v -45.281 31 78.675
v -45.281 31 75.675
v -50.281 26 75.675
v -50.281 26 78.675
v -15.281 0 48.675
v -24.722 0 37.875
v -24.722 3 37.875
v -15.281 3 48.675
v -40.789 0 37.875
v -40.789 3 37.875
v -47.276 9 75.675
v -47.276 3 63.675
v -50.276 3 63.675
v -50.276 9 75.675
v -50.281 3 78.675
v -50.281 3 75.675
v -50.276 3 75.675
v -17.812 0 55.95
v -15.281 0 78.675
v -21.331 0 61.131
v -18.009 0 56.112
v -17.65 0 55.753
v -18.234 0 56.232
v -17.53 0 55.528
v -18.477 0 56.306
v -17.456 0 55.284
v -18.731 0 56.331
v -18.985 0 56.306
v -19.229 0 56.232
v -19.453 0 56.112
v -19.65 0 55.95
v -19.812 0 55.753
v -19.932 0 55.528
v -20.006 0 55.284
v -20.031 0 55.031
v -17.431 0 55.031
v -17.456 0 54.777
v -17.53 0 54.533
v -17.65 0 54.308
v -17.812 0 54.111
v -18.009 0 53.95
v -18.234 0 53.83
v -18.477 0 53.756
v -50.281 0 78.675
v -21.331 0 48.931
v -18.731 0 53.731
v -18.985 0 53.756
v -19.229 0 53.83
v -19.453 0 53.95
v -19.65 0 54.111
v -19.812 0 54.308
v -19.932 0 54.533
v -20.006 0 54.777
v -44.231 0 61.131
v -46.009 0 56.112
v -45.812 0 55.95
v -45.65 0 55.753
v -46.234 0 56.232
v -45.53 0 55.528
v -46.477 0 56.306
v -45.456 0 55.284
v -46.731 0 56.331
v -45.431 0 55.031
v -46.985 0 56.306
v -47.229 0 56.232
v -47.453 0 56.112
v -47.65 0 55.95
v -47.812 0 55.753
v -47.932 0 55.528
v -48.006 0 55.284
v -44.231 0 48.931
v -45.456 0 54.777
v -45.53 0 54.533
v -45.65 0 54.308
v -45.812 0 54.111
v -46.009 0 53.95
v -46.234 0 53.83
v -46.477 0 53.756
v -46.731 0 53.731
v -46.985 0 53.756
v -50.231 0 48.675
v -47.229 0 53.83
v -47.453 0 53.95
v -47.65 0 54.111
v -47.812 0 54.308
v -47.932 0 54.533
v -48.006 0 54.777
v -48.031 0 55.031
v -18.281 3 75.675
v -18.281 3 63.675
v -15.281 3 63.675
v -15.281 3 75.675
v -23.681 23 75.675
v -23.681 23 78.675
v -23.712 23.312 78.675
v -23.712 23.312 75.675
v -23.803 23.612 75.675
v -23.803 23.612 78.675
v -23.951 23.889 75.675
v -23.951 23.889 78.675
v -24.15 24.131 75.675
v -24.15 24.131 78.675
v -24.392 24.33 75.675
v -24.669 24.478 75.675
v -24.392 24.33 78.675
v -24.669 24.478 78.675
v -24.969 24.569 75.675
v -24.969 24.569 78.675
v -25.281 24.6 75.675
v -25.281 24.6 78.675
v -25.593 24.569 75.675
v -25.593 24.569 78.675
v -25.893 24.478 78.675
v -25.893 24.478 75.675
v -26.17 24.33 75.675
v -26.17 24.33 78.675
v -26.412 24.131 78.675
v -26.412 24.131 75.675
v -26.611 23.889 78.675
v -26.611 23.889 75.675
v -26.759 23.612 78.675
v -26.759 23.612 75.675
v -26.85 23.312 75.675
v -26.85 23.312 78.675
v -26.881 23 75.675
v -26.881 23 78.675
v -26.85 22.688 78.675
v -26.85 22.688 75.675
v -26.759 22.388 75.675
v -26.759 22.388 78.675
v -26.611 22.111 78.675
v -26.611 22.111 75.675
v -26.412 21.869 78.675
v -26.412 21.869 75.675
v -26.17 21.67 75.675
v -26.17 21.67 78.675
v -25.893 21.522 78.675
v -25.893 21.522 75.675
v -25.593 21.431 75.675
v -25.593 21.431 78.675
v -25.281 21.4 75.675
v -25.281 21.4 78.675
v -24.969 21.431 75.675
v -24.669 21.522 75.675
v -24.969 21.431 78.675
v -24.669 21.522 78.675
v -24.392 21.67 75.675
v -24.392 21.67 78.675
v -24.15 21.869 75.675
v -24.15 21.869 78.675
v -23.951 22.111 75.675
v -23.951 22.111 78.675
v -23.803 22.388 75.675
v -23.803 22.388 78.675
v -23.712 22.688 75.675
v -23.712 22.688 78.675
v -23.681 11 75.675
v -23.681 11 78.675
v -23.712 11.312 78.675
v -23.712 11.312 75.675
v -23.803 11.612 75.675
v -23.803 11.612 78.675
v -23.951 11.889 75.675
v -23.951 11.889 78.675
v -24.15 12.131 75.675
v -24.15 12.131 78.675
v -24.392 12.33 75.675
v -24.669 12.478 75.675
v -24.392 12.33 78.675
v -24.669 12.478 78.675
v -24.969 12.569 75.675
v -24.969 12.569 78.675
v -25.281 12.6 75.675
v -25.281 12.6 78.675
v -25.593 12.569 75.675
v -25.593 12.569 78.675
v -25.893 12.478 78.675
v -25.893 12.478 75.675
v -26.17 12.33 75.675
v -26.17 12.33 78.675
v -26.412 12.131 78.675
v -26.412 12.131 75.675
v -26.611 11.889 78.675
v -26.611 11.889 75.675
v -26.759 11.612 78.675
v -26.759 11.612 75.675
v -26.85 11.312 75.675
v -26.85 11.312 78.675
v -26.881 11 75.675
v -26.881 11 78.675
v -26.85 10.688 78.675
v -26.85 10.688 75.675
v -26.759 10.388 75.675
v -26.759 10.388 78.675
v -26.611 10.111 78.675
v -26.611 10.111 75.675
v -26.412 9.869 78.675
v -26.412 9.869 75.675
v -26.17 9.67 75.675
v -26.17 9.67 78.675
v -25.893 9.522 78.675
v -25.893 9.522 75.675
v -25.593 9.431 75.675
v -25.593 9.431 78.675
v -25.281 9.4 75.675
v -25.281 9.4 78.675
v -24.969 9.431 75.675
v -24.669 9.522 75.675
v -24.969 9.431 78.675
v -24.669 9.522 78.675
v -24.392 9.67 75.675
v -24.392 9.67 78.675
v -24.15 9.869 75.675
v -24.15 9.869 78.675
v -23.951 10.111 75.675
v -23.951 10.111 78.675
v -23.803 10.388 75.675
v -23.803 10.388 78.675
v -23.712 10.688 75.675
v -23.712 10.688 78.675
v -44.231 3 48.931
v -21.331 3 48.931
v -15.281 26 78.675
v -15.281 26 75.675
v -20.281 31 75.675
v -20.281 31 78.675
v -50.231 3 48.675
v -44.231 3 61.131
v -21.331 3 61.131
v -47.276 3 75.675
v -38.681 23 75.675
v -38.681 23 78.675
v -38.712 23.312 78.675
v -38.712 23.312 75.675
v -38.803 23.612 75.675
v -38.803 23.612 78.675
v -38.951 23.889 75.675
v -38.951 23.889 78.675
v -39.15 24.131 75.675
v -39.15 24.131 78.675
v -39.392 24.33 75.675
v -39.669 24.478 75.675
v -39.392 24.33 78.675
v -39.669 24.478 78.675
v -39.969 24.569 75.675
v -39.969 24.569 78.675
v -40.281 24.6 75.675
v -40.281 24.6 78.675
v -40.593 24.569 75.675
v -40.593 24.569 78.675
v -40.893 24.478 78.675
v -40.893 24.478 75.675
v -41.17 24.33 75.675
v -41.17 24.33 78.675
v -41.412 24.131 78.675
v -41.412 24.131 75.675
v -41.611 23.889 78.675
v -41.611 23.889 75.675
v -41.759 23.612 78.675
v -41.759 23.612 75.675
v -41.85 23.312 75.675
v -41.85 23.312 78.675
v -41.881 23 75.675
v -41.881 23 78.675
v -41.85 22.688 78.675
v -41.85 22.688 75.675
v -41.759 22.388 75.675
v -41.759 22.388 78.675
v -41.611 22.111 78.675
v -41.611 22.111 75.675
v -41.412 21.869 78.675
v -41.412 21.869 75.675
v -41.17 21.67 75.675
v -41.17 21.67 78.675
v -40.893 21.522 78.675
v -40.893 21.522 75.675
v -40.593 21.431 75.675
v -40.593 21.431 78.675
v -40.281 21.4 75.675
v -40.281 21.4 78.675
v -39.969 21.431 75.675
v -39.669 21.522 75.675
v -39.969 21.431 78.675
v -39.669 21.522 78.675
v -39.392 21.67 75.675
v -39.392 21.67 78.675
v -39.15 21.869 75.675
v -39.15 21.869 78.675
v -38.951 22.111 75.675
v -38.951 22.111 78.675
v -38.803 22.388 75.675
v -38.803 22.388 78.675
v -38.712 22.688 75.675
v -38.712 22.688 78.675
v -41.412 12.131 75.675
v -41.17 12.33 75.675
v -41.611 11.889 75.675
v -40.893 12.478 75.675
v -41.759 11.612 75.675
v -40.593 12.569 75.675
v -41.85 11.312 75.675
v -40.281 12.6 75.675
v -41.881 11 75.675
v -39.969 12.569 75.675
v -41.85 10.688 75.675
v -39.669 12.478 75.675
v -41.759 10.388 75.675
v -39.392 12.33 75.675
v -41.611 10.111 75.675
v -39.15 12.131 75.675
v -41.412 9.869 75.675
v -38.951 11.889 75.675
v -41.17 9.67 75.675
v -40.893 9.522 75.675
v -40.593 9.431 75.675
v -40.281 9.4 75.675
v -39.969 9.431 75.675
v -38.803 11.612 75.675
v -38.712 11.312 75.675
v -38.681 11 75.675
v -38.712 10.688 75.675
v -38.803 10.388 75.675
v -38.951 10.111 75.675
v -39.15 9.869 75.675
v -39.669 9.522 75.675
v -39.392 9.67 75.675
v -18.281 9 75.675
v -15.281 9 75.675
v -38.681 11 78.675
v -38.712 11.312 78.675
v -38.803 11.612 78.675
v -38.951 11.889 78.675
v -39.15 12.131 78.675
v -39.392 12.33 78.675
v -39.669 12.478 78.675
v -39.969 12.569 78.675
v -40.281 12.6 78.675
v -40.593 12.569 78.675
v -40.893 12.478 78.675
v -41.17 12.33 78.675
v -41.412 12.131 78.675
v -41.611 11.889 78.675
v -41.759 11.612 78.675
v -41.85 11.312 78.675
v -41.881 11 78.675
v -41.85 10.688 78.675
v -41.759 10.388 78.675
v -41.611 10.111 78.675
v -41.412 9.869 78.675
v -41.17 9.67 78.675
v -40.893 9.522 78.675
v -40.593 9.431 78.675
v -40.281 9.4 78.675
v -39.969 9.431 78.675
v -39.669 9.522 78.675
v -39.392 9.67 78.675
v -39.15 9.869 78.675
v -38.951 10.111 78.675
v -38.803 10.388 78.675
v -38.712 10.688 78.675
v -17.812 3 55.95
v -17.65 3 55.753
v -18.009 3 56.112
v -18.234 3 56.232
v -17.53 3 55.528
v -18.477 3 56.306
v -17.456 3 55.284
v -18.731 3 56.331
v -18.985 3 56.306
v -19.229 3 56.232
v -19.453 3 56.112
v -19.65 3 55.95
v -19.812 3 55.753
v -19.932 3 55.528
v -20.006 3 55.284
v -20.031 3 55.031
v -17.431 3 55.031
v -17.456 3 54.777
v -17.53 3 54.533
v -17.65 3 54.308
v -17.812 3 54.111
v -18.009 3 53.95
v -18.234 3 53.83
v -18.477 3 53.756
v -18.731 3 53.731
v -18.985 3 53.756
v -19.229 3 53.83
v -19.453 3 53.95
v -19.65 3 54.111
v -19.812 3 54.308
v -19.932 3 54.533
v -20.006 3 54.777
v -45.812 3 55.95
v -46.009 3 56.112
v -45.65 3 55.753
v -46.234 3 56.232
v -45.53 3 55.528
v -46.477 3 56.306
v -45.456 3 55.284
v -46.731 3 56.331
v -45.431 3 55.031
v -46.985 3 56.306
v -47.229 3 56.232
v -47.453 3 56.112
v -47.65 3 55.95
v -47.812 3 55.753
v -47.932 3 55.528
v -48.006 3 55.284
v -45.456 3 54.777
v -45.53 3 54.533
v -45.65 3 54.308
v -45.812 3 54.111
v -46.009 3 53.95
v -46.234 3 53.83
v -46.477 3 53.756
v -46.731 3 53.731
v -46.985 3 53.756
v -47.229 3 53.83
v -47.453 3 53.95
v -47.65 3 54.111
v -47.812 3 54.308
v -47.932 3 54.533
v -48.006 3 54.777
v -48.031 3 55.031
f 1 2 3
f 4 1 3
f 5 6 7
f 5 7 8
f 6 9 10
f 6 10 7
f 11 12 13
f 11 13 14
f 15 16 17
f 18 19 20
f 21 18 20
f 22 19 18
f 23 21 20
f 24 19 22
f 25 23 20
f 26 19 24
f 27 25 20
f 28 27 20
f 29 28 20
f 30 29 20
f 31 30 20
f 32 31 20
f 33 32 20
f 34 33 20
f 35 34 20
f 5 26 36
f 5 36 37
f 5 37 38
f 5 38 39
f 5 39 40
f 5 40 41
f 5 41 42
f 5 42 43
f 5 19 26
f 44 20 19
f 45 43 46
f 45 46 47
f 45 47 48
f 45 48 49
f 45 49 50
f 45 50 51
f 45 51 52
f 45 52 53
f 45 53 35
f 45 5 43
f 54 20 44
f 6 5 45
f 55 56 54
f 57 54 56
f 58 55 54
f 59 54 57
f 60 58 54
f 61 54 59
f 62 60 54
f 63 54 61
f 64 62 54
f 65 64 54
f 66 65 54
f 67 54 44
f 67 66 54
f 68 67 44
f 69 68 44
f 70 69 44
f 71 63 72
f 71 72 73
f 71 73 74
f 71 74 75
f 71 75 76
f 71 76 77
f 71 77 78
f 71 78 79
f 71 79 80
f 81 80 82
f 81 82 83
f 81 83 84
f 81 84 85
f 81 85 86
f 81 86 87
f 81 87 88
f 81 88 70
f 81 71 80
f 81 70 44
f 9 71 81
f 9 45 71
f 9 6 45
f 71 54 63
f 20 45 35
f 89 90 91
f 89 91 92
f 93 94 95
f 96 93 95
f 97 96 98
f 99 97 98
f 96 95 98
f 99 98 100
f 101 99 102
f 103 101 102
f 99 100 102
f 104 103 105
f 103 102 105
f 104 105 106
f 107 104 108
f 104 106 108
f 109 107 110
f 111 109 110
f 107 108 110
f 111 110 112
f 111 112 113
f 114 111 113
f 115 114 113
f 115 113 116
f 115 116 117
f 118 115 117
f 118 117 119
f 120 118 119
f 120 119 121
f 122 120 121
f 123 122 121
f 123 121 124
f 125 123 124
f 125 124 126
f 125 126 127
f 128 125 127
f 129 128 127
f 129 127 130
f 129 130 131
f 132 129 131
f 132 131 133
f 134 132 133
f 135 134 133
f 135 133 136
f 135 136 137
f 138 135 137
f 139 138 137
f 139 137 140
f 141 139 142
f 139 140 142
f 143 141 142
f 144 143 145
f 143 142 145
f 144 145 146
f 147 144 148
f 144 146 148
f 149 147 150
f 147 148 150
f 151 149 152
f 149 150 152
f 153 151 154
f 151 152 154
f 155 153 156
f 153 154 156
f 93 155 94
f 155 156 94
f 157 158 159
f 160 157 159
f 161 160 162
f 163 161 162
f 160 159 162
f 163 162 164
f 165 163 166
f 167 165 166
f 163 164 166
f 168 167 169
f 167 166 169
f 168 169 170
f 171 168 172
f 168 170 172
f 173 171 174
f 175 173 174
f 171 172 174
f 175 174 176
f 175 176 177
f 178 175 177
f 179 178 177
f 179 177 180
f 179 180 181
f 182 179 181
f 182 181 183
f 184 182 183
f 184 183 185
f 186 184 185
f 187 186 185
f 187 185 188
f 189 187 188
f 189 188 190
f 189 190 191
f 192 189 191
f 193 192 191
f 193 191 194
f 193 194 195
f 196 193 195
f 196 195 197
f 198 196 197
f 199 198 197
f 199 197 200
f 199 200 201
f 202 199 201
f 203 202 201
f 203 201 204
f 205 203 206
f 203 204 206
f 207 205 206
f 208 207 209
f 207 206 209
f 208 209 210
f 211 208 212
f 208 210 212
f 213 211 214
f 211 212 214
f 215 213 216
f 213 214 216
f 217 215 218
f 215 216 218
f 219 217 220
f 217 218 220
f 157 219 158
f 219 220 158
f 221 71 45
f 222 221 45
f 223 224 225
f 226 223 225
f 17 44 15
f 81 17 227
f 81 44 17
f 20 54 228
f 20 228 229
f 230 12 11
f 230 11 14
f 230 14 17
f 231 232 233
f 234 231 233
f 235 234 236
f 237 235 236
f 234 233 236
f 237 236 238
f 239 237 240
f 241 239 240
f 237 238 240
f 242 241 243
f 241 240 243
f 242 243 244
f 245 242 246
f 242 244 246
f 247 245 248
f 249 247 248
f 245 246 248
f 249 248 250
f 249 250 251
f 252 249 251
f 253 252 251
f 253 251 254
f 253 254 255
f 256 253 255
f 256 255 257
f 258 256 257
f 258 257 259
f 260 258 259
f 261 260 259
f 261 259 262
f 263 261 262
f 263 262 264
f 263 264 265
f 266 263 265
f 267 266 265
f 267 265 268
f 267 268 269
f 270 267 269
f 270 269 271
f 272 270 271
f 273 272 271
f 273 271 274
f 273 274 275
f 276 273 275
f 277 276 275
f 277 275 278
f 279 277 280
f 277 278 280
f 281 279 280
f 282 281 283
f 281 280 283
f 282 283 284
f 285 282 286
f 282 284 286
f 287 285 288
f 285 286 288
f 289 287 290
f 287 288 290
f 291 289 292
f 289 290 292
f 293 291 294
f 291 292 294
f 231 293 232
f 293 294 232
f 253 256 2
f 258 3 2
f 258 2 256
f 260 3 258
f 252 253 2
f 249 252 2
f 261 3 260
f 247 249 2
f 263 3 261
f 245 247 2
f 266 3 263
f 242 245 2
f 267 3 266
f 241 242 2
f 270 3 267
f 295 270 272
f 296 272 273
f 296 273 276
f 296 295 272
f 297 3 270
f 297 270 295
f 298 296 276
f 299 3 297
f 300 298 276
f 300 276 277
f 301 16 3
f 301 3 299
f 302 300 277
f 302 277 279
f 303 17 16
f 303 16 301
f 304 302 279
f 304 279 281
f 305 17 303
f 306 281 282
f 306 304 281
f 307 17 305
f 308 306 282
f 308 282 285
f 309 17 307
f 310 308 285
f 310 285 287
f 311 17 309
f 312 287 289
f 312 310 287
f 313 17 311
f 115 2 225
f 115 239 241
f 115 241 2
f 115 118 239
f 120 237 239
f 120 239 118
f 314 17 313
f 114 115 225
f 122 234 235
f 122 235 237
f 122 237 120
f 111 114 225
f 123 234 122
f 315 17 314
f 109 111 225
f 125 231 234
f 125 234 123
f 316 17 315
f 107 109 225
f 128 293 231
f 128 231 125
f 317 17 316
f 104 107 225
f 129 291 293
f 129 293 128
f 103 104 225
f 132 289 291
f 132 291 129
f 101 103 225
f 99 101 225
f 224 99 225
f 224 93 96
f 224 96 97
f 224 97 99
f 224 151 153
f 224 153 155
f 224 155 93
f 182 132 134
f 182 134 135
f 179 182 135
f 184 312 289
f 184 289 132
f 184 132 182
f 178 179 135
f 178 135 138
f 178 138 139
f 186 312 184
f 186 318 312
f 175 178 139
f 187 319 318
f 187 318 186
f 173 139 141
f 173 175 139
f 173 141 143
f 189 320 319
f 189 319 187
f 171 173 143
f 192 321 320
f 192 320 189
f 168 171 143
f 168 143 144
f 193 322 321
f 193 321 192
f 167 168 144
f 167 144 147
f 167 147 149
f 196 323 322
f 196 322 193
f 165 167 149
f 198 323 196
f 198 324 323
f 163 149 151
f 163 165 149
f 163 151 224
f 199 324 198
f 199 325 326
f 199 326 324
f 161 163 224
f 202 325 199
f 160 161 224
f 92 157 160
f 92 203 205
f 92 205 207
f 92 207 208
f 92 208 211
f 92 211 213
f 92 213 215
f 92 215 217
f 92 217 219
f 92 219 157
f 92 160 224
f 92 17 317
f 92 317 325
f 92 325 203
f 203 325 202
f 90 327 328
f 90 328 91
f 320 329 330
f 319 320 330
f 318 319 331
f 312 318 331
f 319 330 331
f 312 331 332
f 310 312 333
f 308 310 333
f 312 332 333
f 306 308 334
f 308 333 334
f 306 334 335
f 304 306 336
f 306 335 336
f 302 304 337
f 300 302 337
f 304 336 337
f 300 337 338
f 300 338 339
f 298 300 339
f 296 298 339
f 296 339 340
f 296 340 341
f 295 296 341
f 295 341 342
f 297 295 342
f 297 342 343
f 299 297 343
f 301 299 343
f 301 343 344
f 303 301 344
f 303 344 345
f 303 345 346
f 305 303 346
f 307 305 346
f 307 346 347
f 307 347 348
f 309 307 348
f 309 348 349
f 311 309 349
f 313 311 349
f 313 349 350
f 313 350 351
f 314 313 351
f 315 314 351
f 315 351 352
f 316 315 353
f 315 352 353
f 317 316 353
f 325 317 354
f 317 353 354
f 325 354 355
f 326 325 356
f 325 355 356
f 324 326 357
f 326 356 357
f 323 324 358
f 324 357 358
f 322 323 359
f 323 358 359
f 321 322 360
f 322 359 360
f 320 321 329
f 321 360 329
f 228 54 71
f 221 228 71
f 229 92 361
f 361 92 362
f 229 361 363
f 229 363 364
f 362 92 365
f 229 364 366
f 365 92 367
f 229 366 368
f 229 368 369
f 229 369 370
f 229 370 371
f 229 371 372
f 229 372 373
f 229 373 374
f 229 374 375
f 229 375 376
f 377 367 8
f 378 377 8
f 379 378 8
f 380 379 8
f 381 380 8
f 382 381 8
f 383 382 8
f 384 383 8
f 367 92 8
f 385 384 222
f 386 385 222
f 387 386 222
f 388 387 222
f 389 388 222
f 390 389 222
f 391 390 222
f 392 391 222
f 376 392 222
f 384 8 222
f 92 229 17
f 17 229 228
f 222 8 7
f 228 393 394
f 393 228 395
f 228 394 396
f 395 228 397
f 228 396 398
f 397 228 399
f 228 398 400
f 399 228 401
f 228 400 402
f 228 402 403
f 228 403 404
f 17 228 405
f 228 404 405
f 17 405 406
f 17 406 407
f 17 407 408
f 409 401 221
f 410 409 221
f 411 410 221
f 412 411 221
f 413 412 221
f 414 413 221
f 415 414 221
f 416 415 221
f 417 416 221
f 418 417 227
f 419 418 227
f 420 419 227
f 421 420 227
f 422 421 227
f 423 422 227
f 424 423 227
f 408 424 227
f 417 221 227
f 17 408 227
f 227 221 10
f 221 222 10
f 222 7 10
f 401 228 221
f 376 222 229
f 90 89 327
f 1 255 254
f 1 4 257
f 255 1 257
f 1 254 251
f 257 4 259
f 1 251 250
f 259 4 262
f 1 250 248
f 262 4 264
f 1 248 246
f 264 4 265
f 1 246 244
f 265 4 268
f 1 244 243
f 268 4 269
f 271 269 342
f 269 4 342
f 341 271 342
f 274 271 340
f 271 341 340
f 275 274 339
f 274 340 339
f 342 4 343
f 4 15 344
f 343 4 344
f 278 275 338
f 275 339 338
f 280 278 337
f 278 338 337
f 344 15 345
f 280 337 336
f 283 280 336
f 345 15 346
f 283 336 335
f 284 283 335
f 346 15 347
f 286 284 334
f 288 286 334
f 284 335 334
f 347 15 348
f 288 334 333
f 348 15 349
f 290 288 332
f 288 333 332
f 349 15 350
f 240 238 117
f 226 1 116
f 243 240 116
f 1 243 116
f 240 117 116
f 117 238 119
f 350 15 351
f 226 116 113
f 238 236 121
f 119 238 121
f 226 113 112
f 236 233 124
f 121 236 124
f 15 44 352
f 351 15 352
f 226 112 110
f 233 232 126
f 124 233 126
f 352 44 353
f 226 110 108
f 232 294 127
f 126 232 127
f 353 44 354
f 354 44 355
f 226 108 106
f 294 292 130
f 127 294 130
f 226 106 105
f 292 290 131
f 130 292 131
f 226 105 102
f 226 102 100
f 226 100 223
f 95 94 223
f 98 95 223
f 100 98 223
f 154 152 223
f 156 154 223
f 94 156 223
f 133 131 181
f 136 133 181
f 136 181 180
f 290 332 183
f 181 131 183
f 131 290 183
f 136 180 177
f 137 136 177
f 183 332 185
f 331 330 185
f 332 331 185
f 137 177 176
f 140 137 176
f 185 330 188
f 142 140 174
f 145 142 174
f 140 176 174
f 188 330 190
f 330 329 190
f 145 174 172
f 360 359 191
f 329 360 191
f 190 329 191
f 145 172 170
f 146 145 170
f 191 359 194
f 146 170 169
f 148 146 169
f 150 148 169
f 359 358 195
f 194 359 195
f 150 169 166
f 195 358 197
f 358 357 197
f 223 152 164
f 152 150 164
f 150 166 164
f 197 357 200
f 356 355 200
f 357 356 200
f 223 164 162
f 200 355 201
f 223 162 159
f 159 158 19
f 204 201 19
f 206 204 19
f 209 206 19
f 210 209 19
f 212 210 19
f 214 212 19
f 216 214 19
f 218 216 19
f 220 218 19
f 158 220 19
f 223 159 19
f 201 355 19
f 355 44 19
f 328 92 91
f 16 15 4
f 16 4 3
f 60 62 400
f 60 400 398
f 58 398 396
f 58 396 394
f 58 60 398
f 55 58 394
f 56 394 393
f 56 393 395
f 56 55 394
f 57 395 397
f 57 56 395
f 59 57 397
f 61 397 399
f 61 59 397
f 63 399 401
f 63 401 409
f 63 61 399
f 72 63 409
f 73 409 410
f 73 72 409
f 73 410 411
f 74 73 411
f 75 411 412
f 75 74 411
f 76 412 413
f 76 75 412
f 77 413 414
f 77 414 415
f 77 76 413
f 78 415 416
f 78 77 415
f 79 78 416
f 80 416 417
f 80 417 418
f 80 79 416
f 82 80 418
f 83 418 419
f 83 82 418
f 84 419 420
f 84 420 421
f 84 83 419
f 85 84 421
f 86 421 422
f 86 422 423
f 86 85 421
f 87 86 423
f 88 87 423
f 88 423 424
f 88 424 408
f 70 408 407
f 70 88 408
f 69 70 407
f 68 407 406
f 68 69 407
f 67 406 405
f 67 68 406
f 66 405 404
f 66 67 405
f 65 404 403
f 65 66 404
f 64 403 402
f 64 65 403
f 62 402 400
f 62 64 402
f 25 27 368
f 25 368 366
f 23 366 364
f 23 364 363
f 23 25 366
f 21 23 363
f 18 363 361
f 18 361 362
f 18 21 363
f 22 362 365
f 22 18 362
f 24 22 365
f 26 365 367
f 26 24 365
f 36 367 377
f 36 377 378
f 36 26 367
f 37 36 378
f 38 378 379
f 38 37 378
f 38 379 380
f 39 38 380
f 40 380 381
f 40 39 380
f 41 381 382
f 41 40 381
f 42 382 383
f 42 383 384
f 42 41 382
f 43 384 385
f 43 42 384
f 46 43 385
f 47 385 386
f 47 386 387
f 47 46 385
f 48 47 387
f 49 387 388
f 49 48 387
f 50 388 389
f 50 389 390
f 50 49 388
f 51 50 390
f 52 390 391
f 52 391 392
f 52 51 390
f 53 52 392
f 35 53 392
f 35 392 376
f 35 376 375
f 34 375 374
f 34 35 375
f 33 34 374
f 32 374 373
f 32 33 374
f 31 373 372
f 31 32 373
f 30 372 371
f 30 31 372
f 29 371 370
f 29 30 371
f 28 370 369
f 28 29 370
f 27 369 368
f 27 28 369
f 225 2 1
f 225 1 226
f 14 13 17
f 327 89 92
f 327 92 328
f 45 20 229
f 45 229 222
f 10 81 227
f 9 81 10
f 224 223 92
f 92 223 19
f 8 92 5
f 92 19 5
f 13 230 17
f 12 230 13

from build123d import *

# Parameters (mm, degrees)
SKETCH2_R                      = 1.3
SKETCH2_W                      = 22.9
SKETCH2_H                      = 12.2
BOSS_EXTRUDE1_DEPTH            = 3
SKETCH4_W                      = 35
SKETCH4_H                      = 3
BOSS_EXTRUDE2_DEPTH            = 28
CUT_EXTRUDE1_DEPTH             = 8
F_3_2_3_2_DIAMETER_HOLE1_D     = 3.2
F_3_2_3_2_DIAMETER_HOLE1_DEPTH = 3.2
F_3_2_3_2_DIAMETER_HOLE1_TIP   = 0.96137699
GUSSET1_THICKNESS              = 3
GUSSET2_THICKNESS              = 3


with BuildPart() as part:
    # Sketch2 → Boss-Extrude1 (new body)
    with BuildSketch(Plane(origin=(0, 0, 0), x_dir=(1, 0, 0), z_dir=(0, 1, 0))):
        Polygon((-15.281070854, -78.674622905), (-50.281070854, -78.674622905), (-50.230552623, -48.67466544), (-40.789454456, -37.874622905), (-24.722217678, -37.874622905), (-15.281070854, -48.674622905), align=None)
        with Locations(Location((-46.731070854, -55.03062717, 0), (0, 0, 270))):
            Circle(SKETCH2_R, mode=Mode.SUBTRACT)
        with Locations(Location((-18.731070854, -55.03062717, 0), (0, 0, 270))):
            Circle(SKETCH2_R, mode=Mode.SUBTRACT)
        with Locations((-32.781070854, -55.03062717)):
            Rectangle(SKETCH2_W, SKETCH2_H, mode=Mode.SUBTRACT)
    extrude(amount=BOSS_EXTRUDE1_DEPTH)

    # Sketch4 → Boss-Extrude2 (add)
    with BuildSketch(Plane(origin=(0, 3, 0), x_dir=(1, 0, 0), z_dir=(0, 1, 0))):
        with Locations((-32.781070854, -77.174622905)):
            Rectangle(SKETCH4_W, SKETCH4_H)
    extrude(amount=BOSS_EXTRUDE2_DEPTH)

    # Sketch5 → Cut-Extrude1 (cut)
    with BuildSketch(Plane(origin=(0, 0, 75.674622905), x_dir=(-1, 0, 0), z_dir=(0, 0, -1))):
        Polygon((15.281070854, 31), (15.281070854, 26), (20.281070854, 31), align=None)
        Polygon((50.281070854, 31), (45.281070854, 31), (50.281070854, 26), align=None)
    extrude(amount=-CUT_EXTRUDE1_DEPTH, mode=Mode.SUBTRACT)

    # Ø3.2 (3.2) Diameter Hole1
    with Locations(Plane(origin=(0, 0, 75.674622905), x_dir=(-1, 0, 0), z_dir=(0, 0, -1))):
        with Locations((25.281070854, 23), (40.281070854, 23), (40.281070854, 11), (25.281070854, 11), (7.430326382, 12.317521411)):
            Hole(F_3_2_3_2_DIAMETER_HOLE1_D / 2, depth=F_3_2_3_2_DIAMETER_HOLE1_DEPTH)
            with Locations((0, 0, -(F_3_2_3_2_DIAMETER_HOLE1_DEPTH + F_3_2_3_2_DIAMETER_HOLE1_TIP / 2))):  # 118° drill point
                Cone(0, F_3_2_3_2_DIAMETER_HOLE1_D / 2, F_3_2_3_2_DIAMETER_HOLE1_TIP, mode=Mode.SUBTRACT)


with BuildPart() as body_2:
    # Gusset1: a gusset: a plate 3.0 thick in the corner of two members, its outline drawn in place
    gusset1_outline = Wire([Line((-47.276019024, 3, 75.674622905), (-47.276019024, 3, 63.674622905)), Line((-47.276019024, 3, 63.674622905), (-47.276019024, 9, 75.674622905)), Line((-47.276019024, 9, 75.674622905), (-47.276019024, 3, 75.674622905))])
    add(extrude(Face(gusset1_outline), amount=GUSSET1_THICKNESS, dir=(-1, 0, 0)))


with BuildPart() as body_3:
    # Gusset2: a gusset: a plate 3.0 thick in the corner of two members, its outline drawn in place
    gusset2_outline = Wire([Line((-18.281070854, 3, 75.674622905), (-18.281070854, 9, 75.674622905)), Line((-18.281070854, 9, 75.674622905), (-18.281070854, 3, 63.674622905)), Line((-18.281070854, 3, 63.674622905), (-18.281070854, 3, 75.674622905))])
    add(extrude(Face(gusset2_outline), amount=GUSSET2_THICKNESS, dir=(1, 0, 0)))


solid = Compound([part.part, body_2.part, body_3.part])
